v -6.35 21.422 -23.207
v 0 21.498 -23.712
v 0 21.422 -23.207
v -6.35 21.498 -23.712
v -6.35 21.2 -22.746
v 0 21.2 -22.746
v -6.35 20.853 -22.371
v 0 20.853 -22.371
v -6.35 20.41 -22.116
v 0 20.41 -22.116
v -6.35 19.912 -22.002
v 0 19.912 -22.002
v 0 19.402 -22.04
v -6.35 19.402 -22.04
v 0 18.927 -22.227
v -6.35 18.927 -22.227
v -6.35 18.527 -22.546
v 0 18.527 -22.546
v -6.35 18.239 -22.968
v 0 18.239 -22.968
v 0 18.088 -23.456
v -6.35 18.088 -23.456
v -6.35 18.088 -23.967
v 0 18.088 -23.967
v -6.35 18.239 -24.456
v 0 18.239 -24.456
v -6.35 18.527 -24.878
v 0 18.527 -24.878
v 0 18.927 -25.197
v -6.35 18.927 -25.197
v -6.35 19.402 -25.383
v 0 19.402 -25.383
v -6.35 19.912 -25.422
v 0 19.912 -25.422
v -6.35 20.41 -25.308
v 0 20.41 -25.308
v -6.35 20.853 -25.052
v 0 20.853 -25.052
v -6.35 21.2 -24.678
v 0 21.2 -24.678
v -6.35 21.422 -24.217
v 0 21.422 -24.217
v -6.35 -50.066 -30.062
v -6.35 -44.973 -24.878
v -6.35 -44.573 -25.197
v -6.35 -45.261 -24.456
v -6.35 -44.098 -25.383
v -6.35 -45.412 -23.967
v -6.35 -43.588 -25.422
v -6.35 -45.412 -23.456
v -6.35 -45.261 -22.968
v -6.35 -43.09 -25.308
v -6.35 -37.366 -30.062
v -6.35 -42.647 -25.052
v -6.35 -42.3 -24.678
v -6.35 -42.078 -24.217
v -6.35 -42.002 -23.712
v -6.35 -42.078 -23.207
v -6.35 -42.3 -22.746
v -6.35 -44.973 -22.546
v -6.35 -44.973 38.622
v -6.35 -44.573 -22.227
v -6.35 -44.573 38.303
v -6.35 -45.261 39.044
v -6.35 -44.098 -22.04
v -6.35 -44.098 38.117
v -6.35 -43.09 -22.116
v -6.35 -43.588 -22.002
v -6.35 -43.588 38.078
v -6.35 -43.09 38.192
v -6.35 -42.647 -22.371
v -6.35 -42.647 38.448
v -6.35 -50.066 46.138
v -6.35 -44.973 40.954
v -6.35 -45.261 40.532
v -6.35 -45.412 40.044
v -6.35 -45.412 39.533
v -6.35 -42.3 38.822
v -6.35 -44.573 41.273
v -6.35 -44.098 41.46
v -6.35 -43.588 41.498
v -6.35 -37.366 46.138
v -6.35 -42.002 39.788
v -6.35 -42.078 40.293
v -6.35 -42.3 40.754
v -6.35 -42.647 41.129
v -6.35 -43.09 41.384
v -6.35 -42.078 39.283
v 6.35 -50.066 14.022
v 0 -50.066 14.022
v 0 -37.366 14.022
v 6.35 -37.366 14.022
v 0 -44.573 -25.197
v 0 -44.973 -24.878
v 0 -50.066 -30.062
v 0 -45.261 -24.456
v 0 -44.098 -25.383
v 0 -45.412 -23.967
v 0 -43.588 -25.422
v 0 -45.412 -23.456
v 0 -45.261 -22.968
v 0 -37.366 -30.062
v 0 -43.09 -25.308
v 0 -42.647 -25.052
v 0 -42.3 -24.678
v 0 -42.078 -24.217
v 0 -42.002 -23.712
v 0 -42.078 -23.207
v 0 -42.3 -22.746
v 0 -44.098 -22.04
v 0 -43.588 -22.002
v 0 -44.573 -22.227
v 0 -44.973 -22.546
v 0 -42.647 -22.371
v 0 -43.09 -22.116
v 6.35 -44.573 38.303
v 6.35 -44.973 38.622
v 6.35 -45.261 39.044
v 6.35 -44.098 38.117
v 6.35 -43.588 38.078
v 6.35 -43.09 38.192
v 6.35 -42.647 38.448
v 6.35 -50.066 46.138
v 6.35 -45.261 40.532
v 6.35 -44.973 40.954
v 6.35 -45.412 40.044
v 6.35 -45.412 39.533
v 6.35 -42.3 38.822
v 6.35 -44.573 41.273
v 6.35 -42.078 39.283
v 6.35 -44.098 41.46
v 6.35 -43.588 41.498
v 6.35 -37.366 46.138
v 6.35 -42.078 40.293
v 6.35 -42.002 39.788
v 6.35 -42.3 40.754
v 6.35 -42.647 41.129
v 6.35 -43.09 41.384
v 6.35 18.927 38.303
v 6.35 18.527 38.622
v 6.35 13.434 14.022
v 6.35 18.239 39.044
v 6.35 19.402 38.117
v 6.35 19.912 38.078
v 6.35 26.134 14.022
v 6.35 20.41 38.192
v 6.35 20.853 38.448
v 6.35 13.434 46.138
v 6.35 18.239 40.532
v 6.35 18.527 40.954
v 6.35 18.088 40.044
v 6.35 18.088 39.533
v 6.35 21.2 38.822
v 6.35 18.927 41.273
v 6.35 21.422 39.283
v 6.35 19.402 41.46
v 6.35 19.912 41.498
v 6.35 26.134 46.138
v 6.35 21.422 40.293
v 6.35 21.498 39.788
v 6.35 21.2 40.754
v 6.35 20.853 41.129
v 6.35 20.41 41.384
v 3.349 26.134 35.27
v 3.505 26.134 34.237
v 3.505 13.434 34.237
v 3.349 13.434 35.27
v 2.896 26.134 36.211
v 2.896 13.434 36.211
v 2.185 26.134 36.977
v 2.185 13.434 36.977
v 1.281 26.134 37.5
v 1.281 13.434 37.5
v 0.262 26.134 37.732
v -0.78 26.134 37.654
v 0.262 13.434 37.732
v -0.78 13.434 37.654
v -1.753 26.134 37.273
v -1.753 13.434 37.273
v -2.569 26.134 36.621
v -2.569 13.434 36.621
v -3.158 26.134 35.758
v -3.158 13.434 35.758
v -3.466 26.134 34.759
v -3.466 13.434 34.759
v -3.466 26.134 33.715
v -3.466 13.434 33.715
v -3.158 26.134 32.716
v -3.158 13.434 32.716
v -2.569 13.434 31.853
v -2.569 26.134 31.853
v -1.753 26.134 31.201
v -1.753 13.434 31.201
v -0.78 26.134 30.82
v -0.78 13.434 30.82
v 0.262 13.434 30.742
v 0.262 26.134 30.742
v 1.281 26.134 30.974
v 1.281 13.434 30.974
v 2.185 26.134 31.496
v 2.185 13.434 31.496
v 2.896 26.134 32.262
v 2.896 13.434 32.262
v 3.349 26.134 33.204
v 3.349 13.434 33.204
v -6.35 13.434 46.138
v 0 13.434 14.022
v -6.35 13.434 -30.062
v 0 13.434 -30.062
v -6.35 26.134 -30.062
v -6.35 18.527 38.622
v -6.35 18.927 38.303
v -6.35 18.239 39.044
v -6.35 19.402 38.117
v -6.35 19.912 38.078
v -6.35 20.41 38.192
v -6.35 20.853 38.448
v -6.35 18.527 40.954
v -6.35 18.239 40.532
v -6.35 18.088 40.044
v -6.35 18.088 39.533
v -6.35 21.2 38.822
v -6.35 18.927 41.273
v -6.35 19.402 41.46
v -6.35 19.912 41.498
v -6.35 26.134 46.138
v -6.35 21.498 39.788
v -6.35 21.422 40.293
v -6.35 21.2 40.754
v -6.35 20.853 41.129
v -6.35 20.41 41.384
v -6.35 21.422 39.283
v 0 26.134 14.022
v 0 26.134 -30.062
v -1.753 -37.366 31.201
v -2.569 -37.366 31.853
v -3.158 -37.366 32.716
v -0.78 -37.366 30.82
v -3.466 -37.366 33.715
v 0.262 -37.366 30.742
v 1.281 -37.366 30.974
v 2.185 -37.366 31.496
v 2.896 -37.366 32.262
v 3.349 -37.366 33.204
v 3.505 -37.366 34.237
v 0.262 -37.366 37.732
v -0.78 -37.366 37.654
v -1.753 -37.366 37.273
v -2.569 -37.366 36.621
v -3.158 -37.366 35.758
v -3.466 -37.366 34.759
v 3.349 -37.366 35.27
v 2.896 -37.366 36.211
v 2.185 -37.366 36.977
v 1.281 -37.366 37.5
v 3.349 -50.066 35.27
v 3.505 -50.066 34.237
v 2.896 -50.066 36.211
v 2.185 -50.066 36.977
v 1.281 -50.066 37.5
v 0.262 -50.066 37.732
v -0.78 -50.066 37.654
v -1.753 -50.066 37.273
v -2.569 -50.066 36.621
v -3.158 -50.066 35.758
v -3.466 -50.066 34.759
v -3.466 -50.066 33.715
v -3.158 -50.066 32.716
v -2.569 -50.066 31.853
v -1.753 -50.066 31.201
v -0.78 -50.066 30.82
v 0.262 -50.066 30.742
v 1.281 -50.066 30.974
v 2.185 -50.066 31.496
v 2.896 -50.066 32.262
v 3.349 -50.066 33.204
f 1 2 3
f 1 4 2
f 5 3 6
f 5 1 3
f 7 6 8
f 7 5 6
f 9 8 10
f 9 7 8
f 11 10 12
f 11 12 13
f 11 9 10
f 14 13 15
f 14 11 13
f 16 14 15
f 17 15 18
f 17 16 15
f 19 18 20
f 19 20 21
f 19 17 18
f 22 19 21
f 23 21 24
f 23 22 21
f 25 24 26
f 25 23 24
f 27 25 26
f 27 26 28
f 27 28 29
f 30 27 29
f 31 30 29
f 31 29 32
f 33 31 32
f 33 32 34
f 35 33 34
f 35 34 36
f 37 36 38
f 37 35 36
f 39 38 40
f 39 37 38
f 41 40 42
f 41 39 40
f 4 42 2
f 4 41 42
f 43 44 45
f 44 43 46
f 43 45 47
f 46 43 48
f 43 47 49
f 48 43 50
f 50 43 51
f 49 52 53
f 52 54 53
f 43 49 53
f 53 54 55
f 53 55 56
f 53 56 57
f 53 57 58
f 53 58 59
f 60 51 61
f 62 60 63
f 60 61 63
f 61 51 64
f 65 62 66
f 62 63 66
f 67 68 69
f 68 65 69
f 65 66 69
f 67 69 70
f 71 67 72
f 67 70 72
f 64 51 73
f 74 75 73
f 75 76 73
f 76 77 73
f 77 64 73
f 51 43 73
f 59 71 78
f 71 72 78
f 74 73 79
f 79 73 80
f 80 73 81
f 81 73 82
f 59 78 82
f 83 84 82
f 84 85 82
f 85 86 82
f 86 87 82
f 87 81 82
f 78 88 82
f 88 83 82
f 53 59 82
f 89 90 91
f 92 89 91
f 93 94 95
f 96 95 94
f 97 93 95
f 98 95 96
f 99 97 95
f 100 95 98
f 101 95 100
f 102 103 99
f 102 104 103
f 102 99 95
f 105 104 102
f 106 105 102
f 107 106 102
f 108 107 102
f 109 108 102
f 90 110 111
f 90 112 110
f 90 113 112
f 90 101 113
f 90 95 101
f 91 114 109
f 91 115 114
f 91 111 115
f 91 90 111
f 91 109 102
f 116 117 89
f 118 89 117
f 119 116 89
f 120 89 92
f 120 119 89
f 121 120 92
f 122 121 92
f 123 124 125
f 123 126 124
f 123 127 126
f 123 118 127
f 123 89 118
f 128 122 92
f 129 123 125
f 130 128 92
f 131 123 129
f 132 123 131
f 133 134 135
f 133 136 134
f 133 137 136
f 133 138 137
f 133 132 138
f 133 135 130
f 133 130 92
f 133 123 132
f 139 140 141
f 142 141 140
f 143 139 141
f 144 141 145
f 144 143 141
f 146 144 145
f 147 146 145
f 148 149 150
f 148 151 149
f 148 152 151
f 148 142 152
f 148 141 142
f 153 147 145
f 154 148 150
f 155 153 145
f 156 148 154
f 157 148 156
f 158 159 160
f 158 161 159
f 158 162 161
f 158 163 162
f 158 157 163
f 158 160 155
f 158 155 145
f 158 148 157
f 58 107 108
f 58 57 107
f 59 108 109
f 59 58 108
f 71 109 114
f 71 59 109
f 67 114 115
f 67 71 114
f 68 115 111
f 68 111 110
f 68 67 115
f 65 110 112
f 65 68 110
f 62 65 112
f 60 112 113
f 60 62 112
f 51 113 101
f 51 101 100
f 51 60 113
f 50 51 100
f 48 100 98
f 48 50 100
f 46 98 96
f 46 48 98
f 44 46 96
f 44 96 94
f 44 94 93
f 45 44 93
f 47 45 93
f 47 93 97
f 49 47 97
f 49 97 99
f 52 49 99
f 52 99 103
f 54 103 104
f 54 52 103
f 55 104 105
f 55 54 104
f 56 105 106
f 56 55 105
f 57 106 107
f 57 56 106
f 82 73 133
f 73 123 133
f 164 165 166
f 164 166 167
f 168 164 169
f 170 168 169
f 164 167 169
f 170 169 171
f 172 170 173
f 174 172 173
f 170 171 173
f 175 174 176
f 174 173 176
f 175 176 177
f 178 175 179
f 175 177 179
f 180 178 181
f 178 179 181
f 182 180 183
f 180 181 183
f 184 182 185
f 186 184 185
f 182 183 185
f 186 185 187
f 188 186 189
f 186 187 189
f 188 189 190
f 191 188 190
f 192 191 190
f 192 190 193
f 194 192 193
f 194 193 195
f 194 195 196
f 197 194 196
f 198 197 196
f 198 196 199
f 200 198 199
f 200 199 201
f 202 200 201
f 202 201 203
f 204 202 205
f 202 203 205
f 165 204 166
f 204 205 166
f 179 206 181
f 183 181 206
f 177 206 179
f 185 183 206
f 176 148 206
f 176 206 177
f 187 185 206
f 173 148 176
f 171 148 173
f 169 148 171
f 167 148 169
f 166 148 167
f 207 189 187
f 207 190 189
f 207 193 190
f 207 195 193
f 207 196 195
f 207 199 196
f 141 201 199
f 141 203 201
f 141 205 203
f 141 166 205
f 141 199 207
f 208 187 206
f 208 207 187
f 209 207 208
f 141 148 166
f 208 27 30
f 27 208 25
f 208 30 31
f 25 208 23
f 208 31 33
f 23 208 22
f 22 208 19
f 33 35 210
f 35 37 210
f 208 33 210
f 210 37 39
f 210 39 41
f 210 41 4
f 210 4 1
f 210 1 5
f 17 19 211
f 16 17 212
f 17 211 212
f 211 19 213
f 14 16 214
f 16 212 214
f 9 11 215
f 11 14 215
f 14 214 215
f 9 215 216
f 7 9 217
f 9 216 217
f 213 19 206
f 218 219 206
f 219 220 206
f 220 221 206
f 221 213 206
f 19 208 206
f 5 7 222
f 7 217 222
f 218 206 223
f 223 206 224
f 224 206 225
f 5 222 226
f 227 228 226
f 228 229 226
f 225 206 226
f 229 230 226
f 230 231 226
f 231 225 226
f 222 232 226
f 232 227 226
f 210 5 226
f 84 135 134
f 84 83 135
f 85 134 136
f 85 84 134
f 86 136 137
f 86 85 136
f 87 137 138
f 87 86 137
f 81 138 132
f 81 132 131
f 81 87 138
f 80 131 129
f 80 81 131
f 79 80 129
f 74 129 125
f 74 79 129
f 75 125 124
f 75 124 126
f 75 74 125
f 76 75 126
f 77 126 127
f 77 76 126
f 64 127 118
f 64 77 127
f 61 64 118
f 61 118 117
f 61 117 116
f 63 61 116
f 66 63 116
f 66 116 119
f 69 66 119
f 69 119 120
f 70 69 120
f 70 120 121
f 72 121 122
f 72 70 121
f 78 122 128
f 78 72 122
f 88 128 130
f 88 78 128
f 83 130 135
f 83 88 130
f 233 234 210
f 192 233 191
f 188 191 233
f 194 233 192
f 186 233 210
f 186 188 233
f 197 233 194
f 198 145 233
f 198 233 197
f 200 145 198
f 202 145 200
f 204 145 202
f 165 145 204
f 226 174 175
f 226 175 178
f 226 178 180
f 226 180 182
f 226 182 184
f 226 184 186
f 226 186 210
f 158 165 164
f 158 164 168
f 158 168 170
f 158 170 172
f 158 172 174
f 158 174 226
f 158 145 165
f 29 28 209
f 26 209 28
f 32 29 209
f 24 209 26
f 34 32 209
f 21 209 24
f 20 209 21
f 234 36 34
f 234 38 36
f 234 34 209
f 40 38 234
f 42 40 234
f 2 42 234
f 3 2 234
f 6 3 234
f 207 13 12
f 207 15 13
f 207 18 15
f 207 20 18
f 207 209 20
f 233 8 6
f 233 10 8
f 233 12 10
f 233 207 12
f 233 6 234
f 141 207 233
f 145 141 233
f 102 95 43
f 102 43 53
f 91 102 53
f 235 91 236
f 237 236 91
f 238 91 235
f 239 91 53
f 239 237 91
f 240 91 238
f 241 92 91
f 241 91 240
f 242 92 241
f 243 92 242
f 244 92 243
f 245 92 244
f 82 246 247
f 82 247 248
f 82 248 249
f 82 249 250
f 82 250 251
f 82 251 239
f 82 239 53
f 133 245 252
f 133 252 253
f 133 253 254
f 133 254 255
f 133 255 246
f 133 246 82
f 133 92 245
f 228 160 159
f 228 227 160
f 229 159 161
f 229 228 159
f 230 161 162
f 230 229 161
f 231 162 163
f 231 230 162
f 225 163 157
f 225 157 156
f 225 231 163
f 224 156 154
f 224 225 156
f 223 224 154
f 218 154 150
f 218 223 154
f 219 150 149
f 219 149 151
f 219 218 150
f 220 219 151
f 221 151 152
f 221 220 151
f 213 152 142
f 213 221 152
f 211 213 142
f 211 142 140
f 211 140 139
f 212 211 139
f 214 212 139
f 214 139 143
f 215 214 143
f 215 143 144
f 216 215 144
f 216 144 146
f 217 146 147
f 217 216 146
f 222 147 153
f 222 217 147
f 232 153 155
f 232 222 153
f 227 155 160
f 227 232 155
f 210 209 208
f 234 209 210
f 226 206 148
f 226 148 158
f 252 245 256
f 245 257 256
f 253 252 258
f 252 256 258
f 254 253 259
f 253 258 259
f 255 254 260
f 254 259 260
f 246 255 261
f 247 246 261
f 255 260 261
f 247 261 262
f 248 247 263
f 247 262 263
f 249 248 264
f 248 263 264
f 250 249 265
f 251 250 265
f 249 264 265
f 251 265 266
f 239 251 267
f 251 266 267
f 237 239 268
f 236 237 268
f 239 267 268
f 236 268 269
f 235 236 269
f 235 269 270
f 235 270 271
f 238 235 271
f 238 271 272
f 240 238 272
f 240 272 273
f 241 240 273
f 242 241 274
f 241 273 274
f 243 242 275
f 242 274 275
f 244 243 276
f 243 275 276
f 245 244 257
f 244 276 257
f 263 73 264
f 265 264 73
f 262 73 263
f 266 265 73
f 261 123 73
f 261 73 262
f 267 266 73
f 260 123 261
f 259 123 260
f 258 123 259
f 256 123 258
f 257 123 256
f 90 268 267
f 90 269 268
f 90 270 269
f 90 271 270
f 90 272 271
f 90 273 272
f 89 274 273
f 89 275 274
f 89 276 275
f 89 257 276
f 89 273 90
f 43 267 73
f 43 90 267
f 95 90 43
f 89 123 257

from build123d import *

# Parameters (mm, degrees)
F0_W     = 12.7
F0_H     = 32.1159050748
F0_R     = 1.7145
F0_H_2   = 44.0840949252
F1_DEPTH = 6.35
F2_R     = 3.5052
F3_DEPTH = 50.8
F0_H_3   = 21.6972124815
F5_DEPTH = 25.4


with BuildPart() as f1:
    # F0 (on Right) → F1 (new body, symmetric)
    with BuildSketch(Plane.YZ):
        with Locations((-43.7161919508, 30.0801733948)):
            Rectangle(F0_W, F0_H)
        with Locations((-43.7161919508, 39.7881259322)):
            Circle(F0_R, mode=Mode.SUBTRACT)
        with Locations((-43.7161919508, -8.0198266052)):
            Rectangle(F0_W, F0_H_2)
        with Locations((-43.7161919508, -23.7118740678)):
            Circle(F0_R, mode=Mode.SUBTRACT)
    extrude(amount=F1_DEPTH, both=True)


with BuildPart() as f1b:
    # F0 (on Right) → F1, piece 2 (new body, symmetric)
    with BuildSketch(Plane.YZ):
        with Locations((19.7838080492, 30.0801733948)):
            Rectangle(F0_W, F0_H)
        with Locations((19.7838080492, 39.7881259322)):
            Circle(F0_R, mode=Mode.SUBTRACT)
        with Locations((19.7838080492, -8.0198266052)):
            Rectangle(F0_W, F0_H_2)
        with Locations((19.7838080492, -23.7118740678)):
            Circle(F0_R, mode=Mode.SUBTRACT)
    extrude(amount=F1_DEPTH, both=True)


with BuildPart() as f3:
    # F2 (on Front) → F3 (new body, symmetric)
    with BuildSketch(Plane.XZ):
        with Locations((0, 34.2369452119)):
            Circle(F2_R)
    extrude(amount=F3_DEPTH, both=True)


with BuildPart() as f1b_1:
    add(f1b.part)

    # F4: cut F3
    add(f3.part, mode=Mode.SUBTRACT)


with BuildPart() as f1_1:
    add(f1.part)

    # F4: cut F3
    add(f3.part, mode=Mode.SUBTRACT)


with BuildPart() as f5:
    # F0 (on Right) → F5 (new body)
    with BuildSketch(Plane.YZ):
        with Locations((-43.7161919508, -8.0198266052)):
            Rectangle(F0_W, F0_H_2)
        with Locations((-43.7161919508, -23.7118740678)):
            Circle(F0_R, mode=Mode.SUBTRACT)
        with Locations((-43.7161919508, -40.9104803085)):
            Rectangle(F0_W, F0_H_3)
    extrude(amount=F5_DEPTH)


with BuildPart() as f5b:
    # F0 (on Right) → F5, piece 2 (new body)
    with BuildSketch(Plane.YZ):
        with Locations((19.7838080492, -8.0198266052)):
            Rectangle(F0_W, F0_H_2)
        with Locations((19.7838080492, -23.7118740678)):
            Circle(F0_R, mode=Mode.SUBTRACT)
        with Locations((19.7838080492, -40.9104803085)):
            Rectangle(F0_W, F0_H_3)
    extrude(amount=F5_DEPTH)


with BuildPart() as f1b_2:
    add(f1b_1.part)

    # F6: cut F5b, F5
    add(f5b.part, mode=Mode.SUBTRACT)
    add(f5.part, mode=Mode.SUBTRACT)


with BuildPart() as f1_2:
    add(f1_1.part)

    # F6: cut F5b, F5
    add(f5b.part, mode=Mode.SUBTRACT)
    add(f5.part, mode=Mode.SUBTRACT)


solid = Compound([f1b_2.part, f1_2.part])
